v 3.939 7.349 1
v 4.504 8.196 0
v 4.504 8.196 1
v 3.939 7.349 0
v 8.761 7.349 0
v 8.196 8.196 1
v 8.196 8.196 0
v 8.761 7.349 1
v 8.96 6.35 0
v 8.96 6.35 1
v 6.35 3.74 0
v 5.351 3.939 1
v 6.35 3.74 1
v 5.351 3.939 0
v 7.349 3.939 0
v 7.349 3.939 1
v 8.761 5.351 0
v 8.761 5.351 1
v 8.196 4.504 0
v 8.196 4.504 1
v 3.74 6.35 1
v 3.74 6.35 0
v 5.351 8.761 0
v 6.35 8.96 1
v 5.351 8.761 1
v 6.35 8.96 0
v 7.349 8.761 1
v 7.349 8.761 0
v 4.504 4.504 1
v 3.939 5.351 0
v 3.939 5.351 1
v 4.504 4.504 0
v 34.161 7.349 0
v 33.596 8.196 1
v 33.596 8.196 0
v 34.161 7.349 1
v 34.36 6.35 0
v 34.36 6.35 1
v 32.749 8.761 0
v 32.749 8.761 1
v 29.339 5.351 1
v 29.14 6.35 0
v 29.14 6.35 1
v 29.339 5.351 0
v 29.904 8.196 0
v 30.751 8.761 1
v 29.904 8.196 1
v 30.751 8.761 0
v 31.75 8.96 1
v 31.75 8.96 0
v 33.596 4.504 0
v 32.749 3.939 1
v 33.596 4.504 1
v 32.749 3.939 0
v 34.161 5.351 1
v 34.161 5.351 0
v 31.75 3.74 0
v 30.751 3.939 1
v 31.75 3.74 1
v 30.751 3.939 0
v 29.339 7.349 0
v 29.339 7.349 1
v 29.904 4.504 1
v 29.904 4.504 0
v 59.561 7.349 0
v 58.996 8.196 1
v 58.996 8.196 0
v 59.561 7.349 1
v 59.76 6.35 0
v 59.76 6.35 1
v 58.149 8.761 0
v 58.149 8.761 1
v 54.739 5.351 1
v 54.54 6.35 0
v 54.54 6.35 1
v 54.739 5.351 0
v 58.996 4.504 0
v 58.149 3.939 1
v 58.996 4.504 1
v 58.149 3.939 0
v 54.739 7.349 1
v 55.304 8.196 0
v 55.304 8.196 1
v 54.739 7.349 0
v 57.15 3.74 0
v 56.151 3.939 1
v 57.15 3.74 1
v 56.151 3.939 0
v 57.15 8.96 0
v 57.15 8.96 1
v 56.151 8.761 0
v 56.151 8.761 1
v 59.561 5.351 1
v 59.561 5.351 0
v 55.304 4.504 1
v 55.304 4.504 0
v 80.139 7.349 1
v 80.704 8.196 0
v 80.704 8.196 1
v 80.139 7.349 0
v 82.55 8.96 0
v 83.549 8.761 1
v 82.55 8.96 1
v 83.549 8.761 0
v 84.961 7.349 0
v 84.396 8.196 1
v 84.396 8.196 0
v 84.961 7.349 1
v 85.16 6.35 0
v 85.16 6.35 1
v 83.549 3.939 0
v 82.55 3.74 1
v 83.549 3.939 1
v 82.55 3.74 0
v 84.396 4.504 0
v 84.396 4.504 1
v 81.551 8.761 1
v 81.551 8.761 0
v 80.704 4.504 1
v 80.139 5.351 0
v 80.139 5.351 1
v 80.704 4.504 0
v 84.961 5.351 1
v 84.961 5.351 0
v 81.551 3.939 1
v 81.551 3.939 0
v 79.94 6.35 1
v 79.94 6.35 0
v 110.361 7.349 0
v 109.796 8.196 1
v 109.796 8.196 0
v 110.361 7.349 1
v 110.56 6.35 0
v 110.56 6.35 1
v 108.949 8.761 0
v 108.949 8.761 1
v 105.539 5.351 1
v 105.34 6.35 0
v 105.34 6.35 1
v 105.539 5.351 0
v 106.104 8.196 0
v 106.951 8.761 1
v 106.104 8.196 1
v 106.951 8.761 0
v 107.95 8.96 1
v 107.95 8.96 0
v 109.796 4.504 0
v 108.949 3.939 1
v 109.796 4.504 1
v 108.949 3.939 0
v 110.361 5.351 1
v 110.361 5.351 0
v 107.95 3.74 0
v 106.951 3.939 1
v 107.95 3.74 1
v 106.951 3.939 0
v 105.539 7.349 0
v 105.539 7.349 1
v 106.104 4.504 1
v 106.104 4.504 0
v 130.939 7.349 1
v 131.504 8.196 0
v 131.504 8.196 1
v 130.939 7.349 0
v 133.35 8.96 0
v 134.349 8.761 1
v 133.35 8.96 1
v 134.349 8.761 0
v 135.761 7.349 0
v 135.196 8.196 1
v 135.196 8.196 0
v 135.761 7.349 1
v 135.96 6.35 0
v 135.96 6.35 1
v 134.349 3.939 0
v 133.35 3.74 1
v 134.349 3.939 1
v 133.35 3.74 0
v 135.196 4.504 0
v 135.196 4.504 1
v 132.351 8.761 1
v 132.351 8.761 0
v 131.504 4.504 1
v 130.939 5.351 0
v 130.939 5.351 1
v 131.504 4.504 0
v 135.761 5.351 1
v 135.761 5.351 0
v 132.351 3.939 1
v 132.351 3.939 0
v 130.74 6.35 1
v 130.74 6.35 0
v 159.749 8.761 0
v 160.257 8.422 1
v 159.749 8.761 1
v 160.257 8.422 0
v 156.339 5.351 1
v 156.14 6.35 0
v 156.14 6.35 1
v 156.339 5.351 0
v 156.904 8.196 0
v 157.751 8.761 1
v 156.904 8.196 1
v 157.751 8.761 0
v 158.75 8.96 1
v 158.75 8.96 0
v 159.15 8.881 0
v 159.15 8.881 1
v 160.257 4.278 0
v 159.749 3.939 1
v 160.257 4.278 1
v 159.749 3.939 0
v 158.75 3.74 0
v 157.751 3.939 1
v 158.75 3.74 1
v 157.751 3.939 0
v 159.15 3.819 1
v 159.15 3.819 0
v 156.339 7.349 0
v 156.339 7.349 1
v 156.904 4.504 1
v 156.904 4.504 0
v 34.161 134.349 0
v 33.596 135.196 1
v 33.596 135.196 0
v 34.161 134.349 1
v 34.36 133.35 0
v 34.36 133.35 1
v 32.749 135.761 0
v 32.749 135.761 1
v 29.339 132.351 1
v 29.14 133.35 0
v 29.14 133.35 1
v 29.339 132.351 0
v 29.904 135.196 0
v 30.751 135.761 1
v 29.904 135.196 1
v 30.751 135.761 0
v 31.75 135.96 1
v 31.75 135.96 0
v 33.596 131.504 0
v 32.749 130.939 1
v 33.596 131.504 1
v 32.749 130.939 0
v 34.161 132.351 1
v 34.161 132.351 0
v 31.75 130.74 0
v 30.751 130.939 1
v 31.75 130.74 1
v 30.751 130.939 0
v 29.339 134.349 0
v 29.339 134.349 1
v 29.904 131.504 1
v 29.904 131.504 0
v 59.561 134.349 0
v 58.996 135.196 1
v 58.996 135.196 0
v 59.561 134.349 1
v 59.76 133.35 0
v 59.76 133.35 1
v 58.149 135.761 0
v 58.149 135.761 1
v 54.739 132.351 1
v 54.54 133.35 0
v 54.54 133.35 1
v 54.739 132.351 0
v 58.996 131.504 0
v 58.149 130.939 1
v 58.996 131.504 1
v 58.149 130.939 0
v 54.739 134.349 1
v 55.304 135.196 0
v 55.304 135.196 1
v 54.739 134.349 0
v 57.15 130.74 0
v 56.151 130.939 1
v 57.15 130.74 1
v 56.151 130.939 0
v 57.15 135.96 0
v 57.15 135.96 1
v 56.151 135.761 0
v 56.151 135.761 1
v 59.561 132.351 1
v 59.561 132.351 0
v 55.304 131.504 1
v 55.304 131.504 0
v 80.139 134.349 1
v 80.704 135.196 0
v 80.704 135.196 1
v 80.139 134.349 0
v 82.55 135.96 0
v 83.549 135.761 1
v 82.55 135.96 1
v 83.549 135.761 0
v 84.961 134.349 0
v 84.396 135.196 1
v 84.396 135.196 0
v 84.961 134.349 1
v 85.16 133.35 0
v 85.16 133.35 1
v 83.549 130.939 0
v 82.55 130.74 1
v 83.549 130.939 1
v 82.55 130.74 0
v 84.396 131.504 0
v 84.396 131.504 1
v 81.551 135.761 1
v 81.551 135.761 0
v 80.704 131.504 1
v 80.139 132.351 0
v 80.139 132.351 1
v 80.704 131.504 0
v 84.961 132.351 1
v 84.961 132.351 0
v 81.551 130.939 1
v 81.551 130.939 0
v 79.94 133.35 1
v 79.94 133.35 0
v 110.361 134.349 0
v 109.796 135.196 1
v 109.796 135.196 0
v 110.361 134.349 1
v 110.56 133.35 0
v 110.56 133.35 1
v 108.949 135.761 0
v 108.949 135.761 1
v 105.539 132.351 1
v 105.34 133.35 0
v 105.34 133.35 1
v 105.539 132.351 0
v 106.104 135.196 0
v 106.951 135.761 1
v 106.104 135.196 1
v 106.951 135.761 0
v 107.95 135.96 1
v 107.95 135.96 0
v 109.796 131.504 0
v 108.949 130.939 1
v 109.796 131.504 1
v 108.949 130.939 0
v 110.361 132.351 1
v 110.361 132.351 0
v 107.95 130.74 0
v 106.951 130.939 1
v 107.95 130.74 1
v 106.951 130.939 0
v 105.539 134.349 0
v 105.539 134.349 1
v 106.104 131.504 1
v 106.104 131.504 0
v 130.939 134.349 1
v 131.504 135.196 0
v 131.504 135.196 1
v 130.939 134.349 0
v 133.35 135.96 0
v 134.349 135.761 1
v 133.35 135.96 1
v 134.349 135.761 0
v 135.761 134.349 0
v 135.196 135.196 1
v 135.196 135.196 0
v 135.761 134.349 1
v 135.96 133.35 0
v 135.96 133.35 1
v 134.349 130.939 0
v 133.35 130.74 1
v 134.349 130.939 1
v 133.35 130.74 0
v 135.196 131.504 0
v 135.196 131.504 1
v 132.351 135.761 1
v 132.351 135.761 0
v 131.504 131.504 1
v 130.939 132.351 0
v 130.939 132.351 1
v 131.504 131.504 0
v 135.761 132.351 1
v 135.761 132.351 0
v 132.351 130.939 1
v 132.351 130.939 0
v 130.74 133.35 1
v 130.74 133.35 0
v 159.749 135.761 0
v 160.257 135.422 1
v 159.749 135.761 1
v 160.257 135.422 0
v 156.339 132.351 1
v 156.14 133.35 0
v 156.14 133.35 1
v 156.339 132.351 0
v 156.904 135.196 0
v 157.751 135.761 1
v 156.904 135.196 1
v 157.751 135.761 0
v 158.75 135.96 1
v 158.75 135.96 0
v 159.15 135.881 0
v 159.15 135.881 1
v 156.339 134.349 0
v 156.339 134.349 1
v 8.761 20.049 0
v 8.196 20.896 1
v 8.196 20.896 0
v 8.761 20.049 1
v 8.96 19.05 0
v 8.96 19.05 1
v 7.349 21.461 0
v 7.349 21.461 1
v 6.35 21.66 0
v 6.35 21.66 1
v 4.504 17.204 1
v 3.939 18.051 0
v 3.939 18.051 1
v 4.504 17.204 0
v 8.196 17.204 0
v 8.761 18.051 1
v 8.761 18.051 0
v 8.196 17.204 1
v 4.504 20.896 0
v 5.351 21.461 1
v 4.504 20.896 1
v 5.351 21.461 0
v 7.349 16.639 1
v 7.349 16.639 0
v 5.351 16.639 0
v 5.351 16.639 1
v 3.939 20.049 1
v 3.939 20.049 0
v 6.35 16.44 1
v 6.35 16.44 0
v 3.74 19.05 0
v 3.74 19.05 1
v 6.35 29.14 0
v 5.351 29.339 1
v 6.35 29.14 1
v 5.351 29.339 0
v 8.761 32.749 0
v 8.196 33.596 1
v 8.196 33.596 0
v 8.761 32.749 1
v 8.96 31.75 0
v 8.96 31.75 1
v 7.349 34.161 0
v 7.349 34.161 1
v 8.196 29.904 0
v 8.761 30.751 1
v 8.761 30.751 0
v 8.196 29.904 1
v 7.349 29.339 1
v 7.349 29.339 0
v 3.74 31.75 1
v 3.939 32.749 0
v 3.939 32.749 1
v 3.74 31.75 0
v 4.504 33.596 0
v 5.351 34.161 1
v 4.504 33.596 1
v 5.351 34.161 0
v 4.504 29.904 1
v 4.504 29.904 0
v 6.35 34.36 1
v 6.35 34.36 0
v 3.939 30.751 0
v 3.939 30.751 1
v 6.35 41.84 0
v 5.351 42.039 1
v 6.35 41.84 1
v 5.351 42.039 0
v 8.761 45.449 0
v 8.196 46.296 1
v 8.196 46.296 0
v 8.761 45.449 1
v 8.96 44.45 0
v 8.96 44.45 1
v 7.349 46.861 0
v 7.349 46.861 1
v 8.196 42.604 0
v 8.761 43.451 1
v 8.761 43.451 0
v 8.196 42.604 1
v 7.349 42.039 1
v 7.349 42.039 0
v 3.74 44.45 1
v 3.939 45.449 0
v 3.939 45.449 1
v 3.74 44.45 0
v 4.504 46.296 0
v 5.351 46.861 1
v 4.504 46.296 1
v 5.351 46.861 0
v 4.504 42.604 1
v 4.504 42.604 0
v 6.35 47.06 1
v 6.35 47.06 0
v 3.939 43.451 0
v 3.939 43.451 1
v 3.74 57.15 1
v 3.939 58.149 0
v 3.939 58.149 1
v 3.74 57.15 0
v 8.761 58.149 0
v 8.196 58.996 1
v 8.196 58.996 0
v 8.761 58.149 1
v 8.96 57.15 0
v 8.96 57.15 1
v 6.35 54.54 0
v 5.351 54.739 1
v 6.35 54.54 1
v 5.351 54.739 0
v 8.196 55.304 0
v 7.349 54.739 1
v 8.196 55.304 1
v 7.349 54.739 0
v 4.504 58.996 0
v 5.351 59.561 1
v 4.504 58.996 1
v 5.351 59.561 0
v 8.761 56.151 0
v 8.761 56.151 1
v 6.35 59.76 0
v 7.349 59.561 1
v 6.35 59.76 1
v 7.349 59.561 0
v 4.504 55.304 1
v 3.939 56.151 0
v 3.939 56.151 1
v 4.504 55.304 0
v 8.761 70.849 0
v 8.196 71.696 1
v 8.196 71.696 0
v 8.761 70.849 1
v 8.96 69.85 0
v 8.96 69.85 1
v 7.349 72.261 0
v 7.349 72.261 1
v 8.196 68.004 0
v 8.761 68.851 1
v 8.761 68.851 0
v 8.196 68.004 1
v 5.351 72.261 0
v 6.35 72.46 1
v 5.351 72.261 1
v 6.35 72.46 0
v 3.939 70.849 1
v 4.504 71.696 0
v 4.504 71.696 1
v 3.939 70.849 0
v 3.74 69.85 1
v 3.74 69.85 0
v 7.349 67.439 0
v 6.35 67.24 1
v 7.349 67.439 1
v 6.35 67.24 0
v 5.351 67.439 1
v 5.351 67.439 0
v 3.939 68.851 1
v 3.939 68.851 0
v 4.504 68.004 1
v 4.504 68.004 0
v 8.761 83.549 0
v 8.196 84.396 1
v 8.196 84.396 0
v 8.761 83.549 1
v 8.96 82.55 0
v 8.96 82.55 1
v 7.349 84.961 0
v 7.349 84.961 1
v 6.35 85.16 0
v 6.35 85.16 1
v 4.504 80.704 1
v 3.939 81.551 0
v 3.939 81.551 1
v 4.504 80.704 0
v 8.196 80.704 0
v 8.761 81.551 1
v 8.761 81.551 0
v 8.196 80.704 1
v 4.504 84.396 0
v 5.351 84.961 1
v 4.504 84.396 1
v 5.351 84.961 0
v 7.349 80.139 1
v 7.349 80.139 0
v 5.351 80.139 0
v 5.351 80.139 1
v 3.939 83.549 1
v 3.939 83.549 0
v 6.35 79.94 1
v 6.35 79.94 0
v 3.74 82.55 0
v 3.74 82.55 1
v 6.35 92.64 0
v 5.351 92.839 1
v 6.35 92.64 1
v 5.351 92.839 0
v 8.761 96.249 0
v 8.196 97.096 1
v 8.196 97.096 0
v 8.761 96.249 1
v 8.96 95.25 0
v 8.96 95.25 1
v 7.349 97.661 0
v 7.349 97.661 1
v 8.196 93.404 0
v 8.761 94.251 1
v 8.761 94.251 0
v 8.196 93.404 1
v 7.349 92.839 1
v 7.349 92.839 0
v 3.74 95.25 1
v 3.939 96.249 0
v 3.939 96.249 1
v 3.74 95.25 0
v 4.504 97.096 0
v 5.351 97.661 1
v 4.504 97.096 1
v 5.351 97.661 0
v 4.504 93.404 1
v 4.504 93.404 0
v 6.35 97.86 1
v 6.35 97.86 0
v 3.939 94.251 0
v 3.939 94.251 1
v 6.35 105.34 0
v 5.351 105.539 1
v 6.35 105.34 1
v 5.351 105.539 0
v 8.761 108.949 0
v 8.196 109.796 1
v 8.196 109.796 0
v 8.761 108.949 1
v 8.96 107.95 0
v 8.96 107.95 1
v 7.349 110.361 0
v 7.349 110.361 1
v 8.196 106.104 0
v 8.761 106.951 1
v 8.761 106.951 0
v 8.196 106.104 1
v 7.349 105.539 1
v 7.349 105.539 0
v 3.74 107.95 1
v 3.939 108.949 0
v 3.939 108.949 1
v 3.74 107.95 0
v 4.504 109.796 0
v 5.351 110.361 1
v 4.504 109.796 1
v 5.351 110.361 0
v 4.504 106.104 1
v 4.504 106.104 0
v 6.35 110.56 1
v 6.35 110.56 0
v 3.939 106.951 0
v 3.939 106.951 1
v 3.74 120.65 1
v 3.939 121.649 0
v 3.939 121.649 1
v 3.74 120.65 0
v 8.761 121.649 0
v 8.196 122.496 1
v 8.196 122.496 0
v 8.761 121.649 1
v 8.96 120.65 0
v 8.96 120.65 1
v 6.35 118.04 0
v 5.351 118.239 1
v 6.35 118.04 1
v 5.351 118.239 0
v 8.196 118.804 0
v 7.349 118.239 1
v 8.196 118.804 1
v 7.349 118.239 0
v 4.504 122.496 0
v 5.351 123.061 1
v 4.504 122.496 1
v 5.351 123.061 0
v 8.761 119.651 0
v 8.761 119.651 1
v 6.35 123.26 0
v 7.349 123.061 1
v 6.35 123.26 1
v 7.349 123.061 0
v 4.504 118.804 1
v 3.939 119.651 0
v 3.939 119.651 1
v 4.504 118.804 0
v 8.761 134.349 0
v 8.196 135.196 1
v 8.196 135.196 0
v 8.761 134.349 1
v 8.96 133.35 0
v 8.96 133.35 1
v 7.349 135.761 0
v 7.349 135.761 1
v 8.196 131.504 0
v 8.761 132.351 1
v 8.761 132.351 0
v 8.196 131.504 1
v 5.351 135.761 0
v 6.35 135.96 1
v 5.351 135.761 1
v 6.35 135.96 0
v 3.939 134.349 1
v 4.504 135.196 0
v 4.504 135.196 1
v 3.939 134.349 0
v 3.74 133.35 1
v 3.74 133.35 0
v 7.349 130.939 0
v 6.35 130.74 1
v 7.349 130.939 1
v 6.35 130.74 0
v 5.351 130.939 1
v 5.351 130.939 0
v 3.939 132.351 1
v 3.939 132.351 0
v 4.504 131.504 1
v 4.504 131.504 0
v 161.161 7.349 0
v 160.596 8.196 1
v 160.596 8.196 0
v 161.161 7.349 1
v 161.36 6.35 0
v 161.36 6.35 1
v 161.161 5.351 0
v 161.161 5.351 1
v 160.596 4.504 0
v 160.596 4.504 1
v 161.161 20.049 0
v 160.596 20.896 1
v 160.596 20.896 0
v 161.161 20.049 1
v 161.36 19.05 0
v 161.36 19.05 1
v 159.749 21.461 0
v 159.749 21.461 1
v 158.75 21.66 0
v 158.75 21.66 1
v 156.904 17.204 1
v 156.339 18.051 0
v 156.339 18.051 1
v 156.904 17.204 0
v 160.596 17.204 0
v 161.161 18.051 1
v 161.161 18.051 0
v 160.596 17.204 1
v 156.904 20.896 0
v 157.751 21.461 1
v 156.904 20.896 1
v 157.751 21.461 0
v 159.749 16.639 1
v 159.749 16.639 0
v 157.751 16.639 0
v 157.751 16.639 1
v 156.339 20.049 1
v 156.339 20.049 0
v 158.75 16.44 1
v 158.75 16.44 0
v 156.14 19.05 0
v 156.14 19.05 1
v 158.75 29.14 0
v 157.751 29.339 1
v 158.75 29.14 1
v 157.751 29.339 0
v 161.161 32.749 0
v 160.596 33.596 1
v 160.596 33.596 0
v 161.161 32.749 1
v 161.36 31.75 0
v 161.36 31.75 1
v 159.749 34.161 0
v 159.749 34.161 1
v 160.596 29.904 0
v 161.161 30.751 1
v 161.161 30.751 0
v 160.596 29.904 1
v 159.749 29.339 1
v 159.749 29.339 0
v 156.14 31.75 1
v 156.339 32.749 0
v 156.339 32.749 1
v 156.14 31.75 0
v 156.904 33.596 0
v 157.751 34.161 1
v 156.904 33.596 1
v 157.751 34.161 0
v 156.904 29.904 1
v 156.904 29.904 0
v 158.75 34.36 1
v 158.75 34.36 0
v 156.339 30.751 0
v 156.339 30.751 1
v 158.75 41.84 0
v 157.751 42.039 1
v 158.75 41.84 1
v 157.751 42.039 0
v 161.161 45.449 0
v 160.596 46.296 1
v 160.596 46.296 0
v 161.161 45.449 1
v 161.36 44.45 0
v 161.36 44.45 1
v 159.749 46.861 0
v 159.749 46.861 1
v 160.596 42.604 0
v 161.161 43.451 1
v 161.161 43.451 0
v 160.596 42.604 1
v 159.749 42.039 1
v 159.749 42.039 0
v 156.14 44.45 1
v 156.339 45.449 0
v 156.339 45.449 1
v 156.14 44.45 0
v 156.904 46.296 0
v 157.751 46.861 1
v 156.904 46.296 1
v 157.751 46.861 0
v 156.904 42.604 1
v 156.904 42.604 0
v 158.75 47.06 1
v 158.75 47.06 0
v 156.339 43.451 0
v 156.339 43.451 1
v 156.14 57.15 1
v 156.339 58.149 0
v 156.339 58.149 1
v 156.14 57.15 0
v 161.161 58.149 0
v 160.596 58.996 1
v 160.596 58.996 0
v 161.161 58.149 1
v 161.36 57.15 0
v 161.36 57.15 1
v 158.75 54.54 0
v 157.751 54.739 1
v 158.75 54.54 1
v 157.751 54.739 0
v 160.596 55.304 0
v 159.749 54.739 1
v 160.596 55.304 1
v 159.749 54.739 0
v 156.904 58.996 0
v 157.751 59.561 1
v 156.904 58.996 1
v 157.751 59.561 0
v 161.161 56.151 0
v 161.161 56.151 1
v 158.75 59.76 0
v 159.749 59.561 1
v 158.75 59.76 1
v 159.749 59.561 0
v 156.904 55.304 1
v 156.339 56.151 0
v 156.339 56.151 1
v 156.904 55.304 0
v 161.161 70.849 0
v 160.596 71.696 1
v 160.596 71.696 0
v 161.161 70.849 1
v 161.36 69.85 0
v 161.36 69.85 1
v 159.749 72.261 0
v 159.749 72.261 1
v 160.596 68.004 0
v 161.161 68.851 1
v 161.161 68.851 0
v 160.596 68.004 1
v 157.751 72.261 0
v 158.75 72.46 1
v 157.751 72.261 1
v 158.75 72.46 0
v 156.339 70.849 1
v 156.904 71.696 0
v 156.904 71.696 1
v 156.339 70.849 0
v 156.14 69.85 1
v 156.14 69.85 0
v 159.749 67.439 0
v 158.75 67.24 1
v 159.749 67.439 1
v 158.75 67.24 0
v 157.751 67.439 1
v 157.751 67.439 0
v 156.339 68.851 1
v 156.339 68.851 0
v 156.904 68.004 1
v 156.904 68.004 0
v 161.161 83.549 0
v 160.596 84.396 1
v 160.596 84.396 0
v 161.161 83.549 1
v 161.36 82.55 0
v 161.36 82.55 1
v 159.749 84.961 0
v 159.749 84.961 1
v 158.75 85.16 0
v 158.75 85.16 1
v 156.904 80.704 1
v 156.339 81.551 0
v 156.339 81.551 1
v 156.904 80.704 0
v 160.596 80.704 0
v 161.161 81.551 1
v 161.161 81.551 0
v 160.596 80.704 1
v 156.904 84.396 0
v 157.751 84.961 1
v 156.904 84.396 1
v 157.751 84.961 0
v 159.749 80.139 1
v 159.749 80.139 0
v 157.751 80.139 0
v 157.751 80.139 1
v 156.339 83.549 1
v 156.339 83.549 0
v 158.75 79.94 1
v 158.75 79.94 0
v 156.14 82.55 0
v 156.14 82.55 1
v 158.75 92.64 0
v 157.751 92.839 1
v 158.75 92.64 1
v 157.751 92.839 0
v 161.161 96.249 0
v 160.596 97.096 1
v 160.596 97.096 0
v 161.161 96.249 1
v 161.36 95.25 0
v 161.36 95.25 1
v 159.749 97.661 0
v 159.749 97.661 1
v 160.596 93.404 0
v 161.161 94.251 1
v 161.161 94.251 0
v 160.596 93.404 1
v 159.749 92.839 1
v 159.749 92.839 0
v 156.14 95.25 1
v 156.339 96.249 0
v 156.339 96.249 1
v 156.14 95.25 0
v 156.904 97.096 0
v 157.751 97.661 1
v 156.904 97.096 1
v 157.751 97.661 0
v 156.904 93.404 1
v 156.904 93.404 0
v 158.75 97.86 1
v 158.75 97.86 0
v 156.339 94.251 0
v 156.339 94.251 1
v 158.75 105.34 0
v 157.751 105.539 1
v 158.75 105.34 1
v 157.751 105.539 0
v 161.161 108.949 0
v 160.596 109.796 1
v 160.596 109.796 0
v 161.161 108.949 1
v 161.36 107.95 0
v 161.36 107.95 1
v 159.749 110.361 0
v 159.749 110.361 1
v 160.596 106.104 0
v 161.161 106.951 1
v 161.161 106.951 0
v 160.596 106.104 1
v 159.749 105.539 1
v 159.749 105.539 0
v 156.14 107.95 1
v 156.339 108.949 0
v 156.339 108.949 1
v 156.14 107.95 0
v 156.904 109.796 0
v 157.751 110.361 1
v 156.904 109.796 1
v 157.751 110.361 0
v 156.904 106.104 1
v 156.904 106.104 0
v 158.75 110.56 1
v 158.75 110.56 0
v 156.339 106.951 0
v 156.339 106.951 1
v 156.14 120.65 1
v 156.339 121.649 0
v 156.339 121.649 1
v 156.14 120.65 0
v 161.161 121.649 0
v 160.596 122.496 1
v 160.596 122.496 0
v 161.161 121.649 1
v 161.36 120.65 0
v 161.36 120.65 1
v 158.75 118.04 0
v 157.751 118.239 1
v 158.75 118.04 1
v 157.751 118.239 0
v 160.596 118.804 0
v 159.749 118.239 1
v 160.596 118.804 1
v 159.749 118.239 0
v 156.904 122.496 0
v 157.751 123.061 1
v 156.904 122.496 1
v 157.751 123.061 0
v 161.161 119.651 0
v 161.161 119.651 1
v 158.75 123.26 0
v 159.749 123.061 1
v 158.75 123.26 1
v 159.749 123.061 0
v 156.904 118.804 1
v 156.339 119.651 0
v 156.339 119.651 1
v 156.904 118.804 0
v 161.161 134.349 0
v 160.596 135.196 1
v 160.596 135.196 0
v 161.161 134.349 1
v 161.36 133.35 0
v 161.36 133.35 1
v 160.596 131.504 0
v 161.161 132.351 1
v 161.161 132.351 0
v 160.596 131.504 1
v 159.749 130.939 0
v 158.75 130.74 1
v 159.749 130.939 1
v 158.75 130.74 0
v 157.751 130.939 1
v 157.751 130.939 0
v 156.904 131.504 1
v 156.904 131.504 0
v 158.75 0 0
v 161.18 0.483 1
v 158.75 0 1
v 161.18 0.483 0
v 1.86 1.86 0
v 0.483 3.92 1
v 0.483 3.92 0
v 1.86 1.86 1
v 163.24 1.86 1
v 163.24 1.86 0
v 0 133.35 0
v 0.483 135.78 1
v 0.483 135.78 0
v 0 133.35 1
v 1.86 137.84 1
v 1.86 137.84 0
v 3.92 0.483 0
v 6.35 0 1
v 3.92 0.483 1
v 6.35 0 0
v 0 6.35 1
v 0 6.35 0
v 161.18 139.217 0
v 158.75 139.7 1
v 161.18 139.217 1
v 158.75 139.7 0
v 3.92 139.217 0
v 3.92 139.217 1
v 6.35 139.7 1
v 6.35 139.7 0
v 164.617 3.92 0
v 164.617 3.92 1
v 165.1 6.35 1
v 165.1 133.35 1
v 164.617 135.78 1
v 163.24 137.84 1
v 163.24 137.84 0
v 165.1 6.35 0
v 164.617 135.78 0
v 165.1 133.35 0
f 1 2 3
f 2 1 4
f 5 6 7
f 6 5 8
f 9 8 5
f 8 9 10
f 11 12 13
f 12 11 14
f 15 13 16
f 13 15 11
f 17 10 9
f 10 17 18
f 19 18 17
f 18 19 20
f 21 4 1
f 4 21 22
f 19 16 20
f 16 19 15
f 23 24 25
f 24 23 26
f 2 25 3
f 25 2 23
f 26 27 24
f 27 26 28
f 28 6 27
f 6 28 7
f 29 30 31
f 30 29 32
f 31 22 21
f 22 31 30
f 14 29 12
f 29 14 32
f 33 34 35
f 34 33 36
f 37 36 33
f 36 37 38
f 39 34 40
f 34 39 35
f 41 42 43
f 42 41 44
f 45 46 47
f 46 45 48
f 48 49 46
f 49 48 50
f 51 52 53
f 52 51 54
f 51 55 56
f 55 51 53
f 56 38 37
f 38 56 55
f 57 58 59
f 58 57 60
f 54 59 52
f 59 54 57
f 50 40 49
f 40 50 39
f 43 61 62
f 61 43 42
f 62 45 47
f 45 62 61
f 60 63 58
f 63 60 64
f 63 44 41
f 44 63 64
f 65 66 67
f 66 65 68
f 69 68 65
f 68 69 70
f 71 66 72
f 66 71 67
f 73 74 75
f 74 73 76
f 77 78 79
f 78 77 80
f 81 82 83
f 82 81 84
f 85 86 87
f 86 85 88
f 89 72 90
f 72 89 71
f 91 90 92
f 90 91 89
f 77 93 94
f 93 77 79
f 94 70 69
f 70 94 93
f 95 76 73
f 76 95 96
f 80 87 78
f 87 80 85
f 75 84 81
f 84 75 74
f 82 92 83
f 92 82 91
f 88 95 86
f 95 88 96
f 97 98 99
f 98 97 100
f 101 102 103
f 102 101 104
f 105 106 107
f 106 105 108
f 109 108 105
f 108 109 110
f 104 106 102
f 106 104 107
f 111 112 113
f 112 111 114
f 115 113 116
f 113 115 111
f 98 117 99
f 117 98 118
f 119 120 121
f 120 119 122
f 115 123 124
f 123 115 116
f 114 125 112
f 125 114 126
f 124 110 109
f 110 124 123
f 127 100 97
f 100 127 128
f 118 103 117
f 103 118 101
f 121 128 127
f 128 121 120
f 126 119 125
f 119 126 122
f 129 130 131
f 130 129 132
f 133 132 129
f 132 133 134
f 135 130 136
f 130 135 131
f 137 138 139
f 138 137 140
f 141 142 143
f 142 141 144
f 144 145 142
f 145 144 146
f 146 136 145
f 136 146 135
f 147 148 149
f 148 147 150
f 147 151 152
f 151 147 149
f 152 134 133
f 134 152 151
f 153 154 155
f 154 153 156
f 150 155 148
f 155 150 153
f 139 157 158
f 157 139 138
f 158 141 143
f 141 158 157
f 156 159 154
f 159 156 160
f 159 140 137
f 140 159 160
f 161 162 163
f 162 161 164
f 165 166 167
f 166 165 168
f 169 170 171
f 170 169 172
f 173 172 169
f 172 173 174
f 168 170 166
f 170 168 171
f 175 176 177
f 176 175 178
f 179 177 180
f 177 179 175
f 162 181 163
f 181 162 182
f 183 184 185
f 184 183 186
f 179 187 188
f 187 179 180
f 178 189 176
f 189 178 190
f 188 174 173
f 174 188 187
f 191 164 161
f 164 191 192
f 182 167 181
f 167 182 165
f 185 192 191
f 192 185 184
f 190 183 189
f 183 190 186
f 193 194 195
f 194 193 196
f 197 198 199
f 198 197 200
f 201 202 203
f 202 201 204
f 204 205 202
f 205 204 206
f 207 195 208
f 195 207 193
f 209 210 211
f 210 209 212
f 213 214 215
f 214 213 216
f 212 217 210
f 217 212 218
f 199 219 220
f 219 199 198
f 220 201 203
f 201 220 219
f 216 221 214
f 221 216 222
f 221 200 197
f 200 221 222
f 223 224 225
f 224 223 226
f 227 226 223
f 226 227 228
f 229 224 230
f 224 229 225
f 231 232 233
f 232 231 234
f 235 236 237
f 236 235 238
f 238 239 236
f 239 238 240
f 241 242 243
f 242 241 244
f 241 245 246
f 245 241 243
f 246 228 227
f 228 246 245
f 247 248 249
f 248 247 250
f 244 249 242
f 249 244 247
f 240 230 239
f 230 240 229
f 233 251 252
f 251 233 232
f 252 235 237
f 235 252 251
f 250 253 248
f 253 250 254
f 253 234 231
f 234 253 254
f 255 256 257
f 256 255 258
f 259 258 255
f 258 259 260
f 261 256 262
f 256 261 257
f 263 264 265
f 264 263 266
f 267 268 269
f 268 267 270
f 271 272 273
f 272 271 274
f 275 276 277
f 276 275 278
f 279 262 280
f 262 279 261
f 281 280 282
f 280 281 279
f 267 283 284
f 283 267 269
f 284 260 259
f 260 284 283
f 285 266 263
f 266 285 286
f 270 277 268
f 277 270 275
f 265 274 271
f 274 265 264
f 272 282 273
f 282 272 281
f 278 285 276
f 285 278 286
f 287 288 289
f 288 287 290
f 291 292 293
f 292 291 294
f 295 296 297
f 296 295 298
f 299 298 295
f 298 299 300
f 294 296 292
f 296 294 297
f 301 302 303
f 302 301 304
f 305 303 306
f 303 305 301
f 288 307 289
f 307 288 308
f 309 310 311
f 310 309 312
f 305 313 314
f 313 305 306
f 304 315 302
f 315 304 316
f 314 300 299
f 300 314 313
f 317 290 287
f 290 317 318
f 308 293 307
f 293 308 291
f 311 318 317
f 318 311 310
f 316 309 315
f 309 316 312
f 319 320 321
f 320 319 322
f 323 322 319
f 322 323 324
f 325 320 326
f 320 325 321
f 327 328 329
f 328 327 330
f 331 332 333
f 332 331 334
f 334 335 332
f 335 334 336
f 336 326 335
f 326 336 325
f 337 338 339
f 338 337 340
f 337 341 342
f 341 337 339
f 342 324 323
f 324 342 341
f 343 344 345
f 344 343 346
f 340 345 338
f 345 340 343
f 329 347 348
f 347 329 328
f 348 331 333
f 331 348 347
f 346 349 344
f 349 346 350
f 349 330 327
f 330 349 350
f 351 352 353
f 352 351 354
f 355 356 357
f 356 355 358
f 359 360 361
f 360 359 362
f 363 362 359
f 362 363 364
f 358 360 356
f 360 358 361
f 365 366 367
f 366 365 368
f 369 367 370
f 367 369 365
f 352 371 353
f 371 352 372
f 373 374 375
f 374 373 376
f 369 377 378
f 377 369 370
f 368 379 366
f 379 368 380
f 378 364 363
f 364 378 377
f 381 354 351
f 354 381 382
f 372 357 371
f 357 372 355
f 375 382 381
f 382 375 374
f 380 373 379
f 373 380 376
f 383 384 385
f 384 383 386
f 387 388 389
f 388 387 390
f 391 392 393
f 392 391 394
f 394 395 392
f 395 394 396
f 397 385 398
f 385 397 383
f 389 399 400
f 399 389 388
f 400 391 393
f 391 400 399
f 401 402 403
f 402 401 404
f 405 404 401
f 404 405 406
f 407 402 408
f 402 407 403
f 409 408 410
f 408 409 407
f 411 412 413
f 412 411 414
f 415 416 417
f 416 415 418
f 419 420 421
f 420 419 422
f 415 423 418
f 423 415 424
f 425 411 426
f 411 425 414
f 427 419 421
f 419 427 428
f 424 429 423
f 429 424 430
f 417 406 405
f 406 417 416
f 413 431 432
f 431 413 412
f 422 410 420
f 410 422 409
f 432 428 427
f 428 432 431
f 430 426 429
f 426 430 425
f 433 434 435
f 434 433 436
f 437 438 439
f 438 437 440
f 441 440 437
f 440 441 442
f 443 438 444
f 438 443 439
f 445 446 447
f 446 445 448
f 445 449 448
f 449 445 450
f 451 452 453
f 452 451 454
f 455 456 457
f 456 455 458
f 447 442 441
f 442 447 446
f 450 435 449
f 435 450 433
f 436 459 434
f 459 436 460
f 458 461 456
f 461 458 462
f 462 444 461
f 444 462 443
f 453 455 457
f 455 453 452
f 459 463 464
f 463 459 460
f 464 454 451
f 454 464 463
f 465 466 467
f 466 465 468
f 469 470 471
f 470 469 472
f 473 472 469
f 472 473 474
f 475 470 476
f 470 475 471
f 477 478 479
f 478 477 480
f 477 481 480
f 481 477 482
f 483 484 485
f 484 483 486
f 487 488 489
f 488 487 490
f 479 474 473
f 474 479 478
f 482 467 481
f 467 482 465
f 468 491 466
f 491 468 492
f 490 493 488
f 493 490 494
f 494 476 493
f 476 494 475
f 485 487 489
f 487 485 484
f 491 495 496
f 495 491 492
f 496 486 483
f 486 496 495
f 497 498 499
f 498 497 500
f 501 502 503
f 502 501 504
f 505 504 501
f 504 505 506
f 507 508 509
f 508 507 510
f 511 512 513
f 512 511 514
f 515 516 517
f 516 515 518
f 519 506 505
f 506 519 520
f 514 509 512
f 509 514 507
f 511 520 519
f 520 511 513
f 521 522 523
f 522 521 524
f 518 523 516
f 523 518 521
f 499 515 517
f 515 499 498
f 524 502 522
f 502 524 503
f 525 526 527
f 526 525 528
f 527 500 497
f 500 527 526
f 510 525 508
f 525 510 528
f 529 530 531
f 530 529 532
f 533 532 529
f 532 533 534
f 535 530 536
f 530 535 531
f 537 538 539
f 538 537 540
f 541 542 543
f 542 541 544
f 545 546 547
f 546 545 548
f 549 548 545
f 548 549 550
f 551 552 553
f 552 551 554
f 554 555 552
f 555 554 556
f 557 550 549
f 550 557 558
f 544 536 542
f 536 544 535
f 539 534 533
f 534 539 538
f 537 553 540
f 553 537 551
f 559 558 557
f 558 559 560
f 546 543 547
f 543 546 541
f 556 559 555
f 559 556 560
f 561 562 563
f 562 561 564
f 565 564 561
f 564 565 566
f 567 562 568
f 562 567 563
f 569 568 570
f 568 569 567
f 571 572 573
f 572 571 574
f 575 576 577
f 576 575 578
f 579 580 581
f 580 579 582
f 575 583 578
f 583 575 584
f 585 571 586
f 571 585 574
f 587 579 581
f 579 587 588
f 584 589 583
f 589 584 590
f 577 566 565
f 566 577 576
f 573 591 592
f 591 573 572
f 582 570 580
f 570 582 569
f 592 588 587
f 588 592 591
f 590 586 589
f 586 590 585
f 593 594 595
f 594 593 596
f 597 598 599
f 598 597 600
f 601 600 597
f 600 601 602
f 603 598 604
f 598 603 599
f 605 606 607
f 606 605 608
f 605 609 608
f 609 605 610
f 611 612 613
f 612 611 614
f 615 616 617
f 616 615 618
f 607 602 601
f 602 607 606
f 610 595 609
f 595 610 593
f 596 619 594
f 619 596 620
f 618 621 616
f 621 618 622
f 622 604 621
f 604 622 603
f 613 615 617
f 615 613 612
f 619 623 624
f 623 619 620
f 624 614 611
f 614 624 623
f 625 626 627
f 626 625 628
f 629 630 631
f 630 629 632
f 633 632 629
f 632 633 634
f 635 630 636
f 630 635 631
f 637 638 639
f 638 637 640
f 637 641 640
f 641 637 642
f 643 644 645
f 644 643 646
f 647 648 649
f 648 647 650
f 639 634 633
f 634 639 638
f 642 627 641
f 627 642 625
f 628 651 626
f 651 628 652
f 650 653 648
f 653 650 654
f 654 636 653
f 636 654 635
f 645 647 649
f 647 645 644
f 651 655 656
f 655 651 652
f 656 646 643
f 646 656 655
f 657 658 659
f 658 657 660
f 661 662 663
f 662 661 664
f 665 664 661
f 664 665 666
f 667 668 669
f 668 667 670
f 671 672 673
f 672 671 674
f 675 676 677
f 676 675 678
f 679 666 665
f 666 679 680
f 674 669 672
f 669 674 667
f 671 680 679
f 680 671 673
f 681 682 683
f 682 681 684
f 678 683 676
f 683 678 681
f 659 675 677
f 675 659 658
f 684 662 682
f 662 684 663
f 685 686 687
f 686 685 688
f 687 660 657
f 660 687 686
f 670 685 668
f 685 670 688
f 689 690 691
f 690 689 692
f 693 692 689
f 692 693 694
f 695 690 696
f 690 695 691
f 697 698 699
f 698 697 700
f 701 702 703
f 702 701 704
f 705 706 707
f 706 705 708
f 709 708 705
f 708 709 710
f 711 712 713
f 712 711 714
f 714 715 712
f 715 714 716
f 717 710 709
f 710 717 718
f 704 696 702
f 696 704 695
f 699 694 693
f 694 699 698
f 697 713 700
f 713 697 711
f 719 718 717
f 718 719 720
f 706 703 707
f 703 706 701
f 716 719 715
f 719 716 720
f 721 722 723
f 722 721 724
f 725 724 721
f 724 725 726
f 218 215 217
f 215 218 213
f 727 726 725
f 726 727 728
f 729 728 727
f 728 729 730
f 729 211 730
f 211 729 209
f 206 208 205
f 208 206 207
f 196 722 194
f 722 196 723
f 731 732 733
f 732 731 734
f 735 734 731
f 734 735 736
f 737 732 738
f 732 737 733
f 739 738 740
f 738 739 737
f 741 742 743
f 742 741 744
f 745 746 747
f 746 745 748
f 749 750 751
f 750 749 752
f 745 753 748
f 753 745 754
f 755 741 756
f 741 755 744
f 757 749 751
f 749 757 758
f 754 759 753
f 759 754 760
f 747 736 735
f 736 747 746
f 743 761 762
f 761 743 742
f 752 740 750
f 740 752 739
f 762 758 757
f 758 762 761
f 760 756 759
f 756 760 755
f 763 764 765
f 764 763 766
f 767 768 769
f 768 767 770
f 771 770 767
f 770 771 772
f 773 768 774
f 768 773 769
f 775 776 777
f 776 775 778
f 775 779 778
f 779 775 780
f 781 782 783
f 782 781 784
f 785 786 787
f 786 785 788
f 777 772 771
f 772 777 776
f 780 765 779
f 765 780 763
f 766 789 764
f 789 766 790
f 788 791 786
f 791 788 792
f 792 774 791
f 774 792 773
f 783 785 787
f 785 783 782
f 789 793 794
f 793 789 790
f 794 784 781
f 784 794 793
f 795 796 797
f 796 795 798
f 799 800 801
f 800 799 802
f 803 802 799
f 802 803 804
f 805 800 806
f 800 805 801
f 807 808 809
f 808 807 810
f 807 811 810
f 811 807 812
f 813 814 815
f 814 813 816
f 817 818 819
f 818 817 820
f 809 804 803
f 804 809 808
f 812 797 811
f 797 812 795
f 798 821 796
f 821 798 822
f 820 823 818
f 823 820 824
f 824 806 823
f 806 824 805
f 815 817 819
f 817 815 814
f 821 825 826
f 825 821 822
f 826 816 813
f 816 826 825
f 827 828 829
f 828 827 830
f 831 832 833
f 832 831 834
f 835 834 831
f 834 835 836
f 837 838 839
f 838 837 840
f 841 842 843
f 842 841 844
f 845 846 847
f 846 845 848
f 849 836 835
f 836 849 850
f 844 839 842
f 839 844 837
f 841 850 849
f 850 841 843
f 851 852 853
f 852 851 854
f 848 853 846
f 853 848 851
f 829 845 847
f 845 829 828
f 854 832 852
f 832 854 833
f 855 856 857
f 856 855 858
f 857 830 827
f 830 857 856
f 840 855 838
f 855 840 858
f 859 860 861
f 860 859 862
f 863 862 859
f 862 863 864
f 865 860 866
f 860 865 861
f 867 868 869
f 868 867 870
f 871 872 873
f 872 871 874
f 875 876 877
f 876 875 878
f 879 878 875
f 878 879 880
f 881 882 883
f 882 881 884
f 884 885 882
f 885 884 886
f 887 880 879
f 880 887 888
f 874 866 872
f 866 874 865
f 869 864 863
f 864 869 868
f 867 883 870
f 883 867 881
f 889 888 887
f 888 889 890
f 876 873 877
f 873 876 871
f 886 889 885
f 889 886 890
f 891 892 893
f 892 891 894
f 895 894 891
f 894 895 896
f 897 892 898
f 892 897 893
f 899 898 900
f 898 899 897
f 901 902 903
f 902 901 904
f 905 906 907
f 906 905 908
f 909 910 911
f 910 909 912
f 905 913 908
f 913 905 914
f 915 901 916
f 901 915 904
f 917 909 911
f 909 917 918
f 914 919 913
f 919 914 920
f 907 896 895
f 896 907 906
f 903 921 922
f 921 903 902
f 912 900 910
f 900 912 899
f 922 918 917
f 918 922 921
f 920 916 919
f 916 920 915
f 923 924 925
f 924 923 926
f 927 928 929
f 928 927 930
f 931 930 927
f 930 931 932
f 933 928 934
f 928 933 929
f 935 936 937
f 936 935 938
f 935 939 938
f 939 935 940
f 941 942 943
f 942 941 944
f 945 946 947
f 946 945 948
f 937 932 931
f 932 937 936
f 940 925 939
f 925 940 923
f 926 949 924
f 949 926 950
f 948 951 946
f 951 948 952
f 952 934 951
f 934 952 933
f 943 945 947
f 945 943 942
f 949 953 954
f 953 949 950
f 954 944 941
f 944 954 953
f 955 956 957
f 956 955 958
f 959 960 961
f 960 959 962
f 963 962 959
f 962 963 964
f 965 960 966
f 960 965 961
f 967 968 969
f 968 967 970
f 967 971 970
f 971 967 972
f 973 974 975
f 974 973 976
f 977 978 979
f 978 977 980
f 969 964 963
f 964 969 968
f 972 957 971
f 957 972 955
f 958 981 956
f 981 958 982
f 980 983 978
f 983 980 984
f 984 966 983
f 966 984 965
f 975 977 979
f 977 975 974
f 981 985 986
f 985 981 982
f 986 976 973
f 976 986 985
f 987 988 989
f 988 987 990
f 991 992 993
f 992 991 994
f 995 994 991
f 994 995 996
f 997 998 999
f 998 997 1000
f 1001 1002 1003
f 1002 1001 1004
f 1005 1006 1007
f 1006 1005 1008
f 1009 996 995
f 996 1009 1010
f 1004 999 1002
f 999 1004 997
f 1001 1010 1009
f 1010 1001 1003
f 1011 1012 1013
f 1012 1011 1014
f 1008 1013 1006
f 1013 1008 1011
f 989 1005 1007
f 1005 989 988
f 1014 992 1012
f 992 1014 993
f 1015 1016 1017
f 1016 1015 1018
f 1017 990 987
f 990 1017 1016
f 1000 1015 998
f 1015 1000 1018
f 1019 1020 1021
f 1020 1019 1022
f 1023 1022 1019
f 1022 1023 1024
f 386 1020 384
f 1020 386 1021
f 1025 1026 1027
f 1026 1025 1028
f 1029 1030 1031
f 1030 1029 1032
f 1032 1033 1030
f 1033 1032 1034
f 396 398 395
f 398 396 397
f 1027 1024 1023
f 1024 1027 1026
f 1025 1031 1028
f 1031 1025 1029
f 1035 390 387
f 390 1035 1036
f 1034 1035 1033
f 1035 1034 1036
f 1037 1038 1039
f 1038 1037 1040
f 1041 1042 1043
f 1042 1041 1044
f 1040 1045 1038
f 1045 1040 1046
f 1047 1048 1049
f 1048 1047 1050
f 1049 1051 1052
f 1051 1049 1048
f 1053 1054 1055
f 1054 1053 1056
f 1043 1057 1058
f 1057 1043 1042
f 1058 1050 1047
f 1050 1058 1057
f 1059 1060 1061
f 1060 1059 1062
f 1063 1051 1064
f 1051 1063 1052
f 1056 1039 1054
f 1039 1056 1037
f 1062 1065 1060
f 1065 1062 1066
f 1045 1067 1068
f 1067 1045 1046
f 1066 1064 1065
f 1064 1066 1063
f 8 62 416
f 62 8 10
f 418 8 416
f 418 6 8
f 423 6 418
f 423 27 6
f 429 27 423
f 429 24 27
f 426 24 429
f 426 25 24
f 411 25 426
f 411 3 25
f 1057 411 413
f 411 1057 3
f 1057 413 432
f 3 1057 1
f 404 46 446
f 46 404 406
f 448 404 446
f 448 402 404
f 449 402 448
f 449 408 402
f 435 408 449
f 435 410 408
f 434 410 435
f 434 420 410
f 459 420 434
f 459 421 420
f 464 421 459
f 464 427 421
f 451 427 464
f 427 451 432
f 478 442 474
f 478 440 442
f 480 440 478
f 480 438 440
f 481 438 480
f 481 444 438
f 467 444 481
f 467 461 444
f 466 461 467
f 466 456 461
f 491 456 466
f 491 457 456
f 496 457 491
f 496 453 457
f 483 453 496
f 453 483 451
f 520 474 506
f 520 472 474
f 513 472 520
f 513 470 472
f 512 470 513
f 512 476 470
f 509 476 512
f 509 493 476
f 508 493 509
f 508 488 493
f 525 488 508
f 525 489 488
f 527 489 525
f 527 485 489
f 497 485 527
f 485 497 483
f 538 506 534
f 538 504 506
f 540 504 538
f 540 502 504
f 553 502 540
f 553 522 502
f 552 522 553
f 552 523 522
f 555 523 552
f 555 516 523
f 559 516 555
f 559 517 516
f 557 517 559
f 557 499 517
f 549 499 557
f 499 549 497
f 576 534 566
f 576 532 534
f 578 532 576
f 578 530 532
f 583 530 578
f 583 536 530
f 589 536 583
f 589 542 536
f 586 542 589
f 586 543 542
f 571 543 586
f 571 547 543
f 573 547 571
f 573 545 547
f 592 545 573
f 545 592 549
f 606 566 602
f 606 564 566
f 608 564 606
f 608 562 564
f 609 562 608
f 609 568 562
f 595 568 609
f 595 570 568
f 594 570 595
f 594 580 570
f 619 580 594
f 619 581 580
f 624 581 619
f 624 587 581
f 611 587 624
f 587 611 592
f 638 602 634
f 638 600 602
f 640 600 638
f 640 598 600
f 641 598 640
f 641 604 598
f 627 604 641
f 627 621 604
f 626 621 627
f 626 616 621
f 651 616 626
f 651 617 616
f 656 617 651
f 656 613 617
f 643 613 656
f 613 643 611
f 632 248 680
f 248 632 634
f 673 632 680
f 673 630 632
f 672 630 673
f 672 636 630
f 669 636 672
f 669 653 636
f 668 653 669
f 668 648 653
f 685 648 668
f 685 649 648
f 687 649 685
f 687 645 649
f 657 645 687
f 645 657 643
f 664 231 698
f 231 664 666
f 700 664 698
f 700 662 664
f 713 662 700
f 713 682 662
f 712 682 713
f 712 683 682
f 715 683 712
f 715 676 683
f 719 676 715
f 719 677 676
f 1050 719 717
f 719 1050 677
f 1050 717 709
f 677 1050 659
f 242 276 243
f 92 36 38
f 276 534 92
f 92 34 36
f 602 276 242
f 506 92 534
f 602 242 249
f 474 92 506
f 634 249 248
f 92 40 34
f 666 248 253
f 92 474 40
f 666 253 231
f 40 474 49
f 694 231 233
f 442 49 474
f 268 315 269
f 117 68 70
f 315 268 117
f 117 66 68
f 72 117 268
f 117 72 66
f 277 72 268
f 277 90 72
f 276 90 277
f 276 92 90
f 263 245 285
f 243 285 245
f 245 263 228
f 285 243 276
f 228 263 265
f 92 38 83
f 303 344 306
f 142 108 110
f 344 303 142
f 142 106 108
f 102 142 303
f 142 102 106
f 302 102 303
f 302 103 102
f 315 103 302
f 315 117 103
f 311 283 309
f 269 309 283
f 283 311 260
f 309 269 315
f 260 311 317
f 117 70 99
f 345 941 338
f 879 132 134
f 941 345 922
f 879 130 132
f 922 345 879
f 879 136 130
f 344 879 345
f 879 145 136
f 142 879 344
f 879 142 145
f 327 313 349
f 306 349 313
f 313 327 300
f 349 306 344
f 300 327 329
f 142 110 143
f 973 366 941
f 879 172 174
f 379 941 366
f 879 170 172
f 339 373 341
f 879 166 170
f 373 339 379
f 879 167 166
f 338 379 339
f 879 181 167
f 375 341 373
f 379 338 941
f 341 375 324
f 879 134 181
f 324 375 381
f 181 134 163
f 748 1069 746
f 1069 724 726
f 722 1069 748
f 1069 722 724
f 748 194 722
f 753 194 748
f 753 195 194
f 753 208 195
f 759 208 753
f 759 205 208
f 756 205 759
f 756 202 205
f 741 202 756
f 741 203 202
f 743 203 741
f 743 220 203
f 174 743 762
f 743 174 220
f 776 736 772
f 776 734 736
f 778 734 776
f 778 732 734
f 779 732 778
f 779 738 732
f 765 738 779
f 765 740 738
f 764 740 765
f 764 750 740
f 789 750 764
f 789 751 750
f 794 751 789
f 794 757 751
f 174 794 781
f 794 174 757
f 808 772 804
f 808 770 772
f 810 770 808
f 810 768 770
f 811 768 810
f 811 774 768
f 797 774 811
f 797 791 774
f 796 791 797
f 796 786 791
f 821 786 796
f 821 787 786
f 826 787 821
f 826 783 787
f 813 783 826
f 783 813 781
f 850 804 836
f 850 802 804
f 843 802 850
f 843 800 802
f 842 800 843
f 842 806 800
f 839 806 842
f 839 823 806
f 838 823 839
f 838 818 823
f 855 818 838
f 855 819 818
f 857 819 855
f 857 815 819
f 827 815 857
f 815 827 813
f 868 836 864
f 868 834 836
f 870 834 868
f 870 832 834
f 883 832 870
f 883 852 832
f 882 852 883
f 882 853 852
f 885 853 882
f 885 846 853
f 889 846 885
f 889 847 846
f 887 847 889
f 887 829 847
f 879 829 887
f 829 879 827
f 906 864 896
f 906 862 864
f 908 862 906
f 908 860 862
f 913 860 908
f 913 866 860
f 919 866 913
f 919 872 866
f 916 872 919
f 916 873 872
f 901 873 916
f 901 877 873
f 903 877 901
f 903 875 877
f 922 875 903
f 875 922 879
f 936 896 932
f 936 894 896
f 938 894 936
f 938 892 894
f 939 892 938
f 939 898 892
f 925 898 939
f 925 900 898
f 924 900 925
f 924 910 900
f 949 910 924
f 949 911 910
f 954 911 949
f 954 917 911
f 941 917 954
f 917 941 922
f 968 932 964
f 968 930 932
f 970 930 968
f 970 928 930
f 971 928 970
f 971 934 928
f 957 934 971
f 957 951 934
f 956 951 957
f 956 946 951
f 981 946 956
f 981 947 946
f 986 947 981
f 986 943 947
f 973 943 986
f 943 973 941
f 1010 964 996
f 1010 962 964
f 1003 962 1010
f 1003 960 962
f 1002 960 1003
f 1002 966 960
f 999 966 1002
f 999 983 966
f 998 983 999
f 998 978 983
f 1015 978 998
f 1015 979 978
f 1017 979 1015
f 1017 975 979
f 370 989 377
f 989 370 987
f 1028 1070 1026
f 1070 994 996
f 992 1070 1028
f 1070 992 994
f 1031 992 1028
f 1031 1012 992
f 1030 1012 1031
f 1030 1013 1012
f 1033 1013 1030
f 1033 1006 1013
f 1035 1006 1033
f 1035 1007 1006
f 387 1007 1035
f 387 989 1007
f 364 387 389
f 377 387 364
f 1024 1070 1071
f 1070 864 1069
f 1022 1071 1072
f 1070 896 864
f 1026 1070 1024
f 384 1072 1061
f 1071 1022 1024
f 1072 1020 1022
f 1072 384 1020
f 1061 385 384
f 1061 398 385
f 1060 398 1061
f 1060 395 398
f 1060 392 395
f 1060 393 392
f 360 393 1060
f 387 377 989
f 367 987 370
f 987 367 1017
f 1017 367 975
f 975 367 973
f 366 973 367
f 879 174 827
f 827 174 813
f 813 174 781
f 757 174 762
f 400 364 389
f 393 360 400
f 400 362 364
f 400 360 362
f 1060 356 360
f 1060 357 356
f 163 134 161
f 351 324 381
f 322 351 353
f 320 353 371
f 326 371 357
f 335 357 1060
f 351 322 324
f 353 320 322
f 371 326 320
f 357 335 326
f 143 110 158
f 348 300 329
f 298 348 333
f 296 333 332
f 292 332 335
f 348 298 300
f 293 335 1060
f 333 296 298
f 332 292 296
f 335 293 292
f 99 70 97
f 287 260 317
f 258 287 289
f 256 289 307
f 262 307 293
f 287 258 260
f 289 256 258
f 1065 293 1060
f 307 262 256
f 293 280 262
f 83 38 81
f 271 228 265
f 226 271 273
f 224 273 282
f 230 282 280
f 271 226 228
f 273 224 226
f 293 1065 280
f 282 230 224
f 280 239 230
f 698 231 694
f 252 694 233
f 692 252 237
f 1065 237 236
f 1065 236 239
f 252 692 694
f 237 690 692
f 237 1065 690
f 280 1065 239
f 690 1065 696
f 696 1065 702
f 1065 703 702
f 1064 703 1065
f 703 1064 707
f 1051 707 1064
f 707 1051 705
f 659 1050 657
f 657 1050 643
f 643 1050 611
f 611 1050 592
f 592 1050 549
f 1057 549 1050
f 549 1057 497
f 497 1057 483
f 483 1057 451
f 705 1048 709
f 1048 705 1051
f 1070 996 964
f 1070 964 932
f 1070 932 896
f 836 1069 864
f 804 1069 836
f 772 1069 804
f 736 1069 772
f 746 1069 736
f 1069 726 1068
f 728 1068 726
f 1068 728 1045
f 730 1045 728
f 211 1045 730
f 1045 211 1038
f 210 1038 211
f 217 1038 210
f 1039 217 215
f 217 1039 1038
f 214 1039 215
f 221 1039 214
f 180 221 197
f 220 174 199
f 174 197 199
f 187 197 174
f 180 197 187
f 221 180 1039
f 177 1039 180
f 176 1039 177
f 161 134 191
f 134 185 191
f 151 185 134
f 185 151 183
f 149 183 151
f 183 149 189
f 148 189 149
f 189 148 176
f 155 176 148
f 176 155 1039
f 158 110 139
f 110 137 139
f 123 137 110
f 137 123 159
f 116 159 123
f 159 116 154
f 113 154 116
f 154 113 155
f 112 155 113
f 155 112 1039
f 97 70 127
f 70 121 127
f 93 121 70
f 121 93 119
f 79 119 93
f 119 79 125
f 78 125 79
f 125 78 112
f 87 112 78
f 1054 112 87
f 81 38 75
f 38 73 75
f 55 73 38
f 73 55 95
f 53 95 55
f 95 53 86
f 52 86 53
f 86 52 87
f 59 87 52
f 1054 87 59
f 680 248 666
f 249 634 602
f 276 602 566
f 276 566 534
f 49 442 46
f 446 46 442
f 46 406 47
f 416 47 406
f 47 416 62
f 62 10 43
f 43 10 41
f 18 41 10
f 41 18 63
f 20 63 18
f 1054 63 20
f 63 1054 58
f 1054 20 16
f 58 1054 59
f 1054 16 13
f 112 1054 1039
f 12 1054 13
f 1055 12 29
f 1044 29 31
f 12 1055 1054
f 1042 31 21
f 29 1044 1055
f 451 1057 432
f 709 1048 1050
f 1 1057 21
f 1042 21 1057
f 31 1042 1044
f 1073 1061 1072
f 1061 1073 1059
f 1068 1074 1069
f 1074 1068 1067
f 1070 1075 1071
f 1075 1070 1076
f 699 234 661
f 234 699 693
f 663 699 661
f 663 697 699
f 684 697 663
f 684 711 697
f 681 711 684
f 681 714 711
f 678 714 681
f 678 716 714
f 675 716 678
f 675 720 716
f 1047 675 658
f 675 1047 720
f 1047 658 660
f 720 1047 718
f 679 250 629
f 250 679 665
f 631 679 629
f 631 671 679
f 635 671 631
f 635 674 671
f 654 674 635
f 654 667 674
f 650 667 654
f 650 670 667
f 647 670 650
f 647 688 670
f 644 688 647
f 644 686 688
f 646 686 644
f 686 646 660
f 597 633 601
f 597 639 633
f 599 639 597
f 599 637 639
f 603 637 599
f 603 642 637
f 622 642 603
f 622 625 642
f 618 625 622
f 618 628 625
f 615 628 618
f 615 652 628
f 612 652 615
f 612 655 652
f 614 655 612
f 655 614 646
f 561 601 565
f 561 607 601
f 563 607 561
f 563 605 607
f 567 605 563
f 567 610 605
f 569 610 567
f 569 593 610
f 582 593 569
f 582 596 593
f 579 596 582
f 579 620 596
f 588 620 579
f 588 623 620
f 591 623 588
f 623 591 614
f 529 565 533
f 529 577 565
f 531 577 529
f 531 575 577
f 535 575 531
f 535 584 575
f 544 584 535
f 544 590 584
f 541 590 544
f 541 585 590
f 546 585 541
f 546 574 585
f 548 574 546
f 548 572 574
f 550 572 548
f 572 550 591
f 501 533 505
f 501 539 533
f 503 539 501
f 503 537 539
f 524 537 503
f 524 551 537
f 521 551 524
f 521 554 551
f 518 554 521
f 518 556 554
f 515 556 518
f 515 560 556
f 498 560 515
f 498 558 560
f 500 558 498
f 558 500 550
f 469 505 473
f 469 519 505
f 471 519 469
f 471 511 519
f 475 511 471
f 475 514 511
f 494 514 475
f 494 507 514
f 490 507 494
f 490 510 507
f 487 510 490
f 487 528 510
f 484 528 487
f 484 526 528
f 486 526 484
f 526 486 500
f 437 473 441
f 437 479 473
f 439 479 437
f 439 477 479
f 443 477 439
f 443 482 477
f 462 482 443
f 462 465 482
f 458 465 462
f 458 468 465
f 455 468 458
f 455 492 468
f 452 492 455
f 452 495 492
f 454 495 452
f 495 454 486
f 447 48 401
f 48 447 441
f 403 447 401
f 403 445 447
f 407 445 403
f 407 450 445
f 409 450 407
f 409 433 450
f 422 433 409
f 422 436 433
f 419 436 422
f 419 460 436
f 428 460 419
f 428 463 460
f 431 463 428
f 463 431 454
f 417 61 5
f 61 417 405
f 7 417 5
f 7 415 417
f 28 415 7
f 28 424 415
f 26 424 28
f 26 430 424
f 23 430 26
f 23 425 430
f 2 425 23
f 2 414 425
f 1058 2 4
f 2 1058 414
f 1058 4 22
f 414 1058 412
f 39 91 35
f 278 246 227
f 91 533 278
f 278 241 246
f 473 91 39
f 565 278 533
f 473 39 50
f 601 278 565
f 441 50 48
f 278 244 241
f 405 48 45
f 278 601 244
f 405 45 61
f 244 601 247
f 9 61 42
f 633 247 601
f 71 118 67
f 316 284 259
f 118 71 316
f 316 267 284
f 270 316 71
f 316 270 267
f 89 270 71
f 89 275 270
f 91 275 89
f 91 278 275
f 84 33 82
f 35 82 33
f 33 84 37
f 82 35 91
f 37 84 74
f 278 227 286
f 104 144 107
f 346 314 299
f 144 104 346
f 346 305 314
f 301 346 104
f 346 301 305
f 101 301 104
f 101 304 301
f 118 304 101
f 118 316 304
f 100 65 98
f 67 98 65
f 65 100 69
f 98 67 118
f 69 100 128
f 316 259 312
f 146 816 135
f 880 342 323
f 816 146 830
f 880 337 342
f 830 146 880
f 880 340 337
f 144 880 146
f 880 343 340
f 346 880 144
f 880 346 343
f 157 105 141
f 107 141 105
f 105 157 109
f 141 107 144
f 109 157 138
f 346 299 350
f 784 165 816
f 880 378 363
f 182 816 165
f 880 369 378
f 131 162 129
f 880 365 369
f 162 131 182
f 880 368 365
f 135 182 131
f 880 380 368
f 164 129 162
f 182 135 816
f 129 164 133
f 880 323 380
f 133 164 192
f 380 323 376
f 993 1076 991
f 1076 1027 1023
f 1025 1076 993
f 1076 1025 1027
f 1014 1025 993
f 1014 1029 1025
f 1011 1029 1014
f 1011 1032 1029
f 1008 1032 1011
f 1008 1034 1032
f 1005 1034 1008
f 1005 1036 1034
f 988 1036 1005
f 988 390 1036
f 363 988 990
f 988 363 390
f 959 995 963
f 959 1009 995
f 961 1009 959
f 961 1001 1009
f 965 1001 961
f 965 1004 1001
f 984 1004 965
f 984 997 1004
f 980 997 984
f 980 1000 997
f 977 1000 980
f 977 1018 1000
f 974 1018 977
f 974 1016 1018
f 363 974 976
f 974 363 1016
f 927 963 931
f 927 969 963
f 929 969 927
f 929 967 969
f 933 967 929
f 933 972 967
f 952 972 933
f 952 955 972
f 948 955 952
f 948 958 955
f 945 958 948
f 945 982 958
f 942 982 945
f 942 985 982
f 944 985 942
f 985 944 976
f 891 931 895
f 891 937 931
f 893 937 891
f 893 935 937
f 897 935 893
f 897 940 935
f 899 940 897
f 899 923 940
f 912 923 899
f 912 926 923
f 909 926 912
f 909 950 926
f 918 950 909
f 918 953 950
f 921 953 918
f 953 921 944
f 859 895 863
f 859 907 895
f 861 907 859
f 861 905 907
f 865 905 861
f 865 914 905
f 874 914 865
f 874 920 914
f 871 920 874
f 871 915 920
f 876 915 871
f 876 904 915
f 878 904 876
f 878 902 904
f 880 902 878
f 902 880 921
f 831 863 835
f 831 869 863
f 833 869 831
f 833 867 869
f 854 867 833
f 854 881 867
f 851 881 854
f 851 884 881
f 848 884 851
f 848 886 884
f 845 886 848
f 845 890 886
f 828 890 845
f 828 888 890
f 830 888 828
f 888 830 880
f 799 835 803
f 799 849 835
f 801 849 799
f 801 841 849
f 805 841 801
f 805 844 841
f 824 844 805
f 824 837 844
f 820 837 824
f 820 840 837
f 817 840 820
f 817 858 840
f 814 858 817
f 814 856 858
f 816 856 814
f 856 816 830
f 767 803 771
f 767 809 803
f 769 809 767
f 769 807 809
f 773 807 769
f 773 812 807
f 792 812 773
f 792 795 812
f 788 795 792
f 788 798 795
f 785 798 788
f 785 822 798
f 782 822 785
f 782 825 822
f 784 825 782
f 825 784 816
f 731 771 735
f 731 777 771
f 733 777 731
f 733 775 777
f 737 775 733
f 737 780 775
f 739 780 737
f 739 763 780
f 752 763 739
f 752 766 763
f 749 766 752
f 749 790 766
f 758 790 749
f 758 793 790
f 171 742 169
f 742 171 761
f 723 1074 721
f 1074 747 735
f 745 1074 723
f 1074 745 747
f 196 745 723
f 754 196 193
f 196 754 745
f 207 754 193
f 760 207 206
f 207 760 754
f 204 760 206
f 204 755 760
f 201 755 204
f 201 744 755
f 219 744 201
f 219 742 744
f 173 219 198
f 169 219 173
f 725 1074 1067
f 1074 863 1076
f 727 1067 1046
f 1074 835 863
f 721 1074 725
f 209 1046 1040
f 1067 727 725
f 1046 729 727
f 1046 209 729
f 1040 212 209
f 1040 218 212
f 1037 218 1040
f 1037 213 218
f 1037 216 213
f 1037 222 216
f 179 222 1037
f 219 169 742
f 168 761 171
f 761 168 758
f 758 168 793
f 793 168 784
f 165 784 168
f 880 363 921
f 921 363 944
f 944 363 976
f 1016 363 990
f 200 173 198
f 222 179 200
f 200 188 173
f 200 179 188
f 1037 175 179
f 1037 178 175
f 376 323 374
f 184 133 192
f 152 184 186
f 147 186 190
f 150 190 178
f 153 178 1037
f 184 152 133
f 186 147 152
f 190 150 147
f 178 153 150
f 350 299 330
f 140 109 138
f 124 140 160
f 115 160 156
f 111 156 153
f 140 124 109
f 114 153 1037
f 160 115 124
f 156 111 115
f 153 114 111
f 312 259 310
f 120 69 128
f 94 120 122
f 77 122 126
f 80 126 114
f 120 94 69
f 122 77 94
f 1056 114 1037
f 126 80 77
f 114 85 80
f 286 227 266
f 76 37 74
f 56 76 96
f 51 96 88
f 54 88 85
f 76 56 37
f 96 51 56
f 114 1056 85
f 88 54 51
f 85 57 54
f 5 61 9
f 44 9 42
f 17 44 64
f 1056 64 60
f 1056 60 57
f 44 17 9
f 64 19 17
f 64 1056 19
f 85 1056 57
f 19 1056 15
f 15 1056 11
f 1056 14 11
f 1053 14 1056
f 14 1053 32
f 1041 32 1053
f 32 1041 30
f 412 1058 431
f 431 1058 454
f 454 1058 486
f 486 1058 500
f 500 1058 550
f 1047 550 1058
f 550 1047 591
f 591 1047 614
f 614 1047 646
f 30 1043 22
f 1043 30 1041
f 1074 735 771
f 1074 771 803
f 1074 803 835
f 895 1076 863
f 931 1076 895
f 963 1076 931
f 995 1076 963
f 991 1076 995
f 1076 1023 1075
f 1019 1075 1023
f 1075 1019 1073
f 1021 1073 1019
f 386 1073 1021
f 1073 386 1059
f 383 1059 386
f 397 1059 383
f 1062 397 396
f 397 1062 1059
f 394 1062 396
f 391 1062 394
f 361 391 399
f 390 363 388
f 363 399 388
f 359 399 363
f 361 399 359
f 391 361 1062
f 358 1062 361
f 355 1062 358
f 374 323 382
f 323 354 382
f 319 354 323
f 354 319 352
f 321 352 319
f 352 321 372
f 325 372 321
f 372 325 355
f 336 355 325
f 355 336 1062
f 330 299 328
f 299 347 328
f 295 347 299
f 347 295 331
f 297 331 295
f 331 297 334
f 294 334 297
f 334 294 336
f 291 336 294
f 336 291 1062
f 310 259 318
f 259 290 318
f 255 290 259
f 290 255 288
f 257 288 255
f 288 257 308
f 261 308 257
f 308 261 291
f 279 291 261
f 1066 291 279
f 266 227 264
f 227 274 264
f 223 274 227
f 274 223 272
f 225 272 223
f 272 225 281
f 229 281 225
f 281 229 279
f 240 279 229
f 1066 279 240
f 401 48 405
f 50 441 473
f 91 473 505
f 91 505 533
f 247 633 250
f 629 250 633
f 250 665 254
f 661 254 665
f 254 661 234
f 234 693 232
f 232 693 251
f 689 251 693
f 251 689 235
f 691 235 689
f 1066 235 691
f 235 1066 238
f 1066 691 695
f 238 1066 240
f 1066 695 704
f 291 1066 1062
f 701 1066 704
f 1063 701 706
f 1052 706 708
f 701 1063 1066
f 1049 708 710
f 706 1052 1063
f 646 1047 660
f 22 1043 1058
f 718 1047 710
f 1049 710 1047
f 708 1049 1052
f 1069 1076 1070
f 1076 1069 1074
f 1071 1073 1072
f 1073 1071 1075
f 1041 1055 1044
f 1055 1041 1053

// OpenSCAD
$inch = 25.4;

$x_dim = 6.5 * $inch;
$y_dim = 5.5 * $inch;

$corner_radius = 0.25 * $inch;
$x_separation = $x_dim - (2*$corner_radius);
$y_separation = $y_dim - (2*$corner_radius);
    
$hole_rad = 5.22/2;

$fn=16;

module make_plate() {
    hull() {
        translate([$corner_radius,$corner_radius,0]) {
            cylinder(r=$corner_radius, h=1);
        }
        translate([$corner_radius+$x_separation, $corner_radius, 0]) {
            cylinder(r=$corner_radius, h=1);
        }
        translate([$corner_radius, $corner_radius+$y_separation, 0]) {
            cylinder(r=$corner_radius, h=1);
        }
        translate([$corner_radius+$x_separation, $corner_radius+$y_separation, 0]) {
            cylinder(r=$corner_radius, h=1);
        }
    }    
}

module make_parts() {
    difference() {
        make_plate($x_dim, $y_dim, $corner_radius);
        // low y row in x direction
        translate([$corner_radius, $corner_radius, -1]) {
            for(hole_count = [0 : 1 : 6]) {
                translate([hole_count*$inch, 0,0]) {
                    cylinder(r=$hole_rad, h=3);
                }
            }
        }
        // high y row in x direction
        translate([$corner_radius, $corner_radius+$y_separation, -1]) {
            for(hole_count = [0 : 1 : 6]) {
                translate([hole_count*$inch, 0,0]) {
                    cylinder(r=$hole_rad, h=3);
                }
            }
        }  
        // low x in y direction
        translate([$corner_radius, $corner_radius, -1]) {
            for(hole_count = [0 : 1 : 10]) {
                translate([0, hole_count*$inch/2,0]) {
                    cylinder(r=$hole_rad, h=3);
                }
            }
        }  
        // high x in y direction
        translate([$corner_radius+$x_separation, $corner_radius, -1]) {
            for(hole_count = [0 : 1 : 10]) {
                translate([0, hole_count*$inch/2,0]) {
                    cylinder(r=$hole_rad, h=3);
                }
            }
        }         
    }
}

$2d = 0;
if ($2d) {
    projection(cut=true) {
       translate([0,0,0]) rotate([0,0,0]) {
         make_parts();
       }
    }
} else {
    translate([0,0,0]) rotate([0,0,0]) {
        make_parts();
    }
}
